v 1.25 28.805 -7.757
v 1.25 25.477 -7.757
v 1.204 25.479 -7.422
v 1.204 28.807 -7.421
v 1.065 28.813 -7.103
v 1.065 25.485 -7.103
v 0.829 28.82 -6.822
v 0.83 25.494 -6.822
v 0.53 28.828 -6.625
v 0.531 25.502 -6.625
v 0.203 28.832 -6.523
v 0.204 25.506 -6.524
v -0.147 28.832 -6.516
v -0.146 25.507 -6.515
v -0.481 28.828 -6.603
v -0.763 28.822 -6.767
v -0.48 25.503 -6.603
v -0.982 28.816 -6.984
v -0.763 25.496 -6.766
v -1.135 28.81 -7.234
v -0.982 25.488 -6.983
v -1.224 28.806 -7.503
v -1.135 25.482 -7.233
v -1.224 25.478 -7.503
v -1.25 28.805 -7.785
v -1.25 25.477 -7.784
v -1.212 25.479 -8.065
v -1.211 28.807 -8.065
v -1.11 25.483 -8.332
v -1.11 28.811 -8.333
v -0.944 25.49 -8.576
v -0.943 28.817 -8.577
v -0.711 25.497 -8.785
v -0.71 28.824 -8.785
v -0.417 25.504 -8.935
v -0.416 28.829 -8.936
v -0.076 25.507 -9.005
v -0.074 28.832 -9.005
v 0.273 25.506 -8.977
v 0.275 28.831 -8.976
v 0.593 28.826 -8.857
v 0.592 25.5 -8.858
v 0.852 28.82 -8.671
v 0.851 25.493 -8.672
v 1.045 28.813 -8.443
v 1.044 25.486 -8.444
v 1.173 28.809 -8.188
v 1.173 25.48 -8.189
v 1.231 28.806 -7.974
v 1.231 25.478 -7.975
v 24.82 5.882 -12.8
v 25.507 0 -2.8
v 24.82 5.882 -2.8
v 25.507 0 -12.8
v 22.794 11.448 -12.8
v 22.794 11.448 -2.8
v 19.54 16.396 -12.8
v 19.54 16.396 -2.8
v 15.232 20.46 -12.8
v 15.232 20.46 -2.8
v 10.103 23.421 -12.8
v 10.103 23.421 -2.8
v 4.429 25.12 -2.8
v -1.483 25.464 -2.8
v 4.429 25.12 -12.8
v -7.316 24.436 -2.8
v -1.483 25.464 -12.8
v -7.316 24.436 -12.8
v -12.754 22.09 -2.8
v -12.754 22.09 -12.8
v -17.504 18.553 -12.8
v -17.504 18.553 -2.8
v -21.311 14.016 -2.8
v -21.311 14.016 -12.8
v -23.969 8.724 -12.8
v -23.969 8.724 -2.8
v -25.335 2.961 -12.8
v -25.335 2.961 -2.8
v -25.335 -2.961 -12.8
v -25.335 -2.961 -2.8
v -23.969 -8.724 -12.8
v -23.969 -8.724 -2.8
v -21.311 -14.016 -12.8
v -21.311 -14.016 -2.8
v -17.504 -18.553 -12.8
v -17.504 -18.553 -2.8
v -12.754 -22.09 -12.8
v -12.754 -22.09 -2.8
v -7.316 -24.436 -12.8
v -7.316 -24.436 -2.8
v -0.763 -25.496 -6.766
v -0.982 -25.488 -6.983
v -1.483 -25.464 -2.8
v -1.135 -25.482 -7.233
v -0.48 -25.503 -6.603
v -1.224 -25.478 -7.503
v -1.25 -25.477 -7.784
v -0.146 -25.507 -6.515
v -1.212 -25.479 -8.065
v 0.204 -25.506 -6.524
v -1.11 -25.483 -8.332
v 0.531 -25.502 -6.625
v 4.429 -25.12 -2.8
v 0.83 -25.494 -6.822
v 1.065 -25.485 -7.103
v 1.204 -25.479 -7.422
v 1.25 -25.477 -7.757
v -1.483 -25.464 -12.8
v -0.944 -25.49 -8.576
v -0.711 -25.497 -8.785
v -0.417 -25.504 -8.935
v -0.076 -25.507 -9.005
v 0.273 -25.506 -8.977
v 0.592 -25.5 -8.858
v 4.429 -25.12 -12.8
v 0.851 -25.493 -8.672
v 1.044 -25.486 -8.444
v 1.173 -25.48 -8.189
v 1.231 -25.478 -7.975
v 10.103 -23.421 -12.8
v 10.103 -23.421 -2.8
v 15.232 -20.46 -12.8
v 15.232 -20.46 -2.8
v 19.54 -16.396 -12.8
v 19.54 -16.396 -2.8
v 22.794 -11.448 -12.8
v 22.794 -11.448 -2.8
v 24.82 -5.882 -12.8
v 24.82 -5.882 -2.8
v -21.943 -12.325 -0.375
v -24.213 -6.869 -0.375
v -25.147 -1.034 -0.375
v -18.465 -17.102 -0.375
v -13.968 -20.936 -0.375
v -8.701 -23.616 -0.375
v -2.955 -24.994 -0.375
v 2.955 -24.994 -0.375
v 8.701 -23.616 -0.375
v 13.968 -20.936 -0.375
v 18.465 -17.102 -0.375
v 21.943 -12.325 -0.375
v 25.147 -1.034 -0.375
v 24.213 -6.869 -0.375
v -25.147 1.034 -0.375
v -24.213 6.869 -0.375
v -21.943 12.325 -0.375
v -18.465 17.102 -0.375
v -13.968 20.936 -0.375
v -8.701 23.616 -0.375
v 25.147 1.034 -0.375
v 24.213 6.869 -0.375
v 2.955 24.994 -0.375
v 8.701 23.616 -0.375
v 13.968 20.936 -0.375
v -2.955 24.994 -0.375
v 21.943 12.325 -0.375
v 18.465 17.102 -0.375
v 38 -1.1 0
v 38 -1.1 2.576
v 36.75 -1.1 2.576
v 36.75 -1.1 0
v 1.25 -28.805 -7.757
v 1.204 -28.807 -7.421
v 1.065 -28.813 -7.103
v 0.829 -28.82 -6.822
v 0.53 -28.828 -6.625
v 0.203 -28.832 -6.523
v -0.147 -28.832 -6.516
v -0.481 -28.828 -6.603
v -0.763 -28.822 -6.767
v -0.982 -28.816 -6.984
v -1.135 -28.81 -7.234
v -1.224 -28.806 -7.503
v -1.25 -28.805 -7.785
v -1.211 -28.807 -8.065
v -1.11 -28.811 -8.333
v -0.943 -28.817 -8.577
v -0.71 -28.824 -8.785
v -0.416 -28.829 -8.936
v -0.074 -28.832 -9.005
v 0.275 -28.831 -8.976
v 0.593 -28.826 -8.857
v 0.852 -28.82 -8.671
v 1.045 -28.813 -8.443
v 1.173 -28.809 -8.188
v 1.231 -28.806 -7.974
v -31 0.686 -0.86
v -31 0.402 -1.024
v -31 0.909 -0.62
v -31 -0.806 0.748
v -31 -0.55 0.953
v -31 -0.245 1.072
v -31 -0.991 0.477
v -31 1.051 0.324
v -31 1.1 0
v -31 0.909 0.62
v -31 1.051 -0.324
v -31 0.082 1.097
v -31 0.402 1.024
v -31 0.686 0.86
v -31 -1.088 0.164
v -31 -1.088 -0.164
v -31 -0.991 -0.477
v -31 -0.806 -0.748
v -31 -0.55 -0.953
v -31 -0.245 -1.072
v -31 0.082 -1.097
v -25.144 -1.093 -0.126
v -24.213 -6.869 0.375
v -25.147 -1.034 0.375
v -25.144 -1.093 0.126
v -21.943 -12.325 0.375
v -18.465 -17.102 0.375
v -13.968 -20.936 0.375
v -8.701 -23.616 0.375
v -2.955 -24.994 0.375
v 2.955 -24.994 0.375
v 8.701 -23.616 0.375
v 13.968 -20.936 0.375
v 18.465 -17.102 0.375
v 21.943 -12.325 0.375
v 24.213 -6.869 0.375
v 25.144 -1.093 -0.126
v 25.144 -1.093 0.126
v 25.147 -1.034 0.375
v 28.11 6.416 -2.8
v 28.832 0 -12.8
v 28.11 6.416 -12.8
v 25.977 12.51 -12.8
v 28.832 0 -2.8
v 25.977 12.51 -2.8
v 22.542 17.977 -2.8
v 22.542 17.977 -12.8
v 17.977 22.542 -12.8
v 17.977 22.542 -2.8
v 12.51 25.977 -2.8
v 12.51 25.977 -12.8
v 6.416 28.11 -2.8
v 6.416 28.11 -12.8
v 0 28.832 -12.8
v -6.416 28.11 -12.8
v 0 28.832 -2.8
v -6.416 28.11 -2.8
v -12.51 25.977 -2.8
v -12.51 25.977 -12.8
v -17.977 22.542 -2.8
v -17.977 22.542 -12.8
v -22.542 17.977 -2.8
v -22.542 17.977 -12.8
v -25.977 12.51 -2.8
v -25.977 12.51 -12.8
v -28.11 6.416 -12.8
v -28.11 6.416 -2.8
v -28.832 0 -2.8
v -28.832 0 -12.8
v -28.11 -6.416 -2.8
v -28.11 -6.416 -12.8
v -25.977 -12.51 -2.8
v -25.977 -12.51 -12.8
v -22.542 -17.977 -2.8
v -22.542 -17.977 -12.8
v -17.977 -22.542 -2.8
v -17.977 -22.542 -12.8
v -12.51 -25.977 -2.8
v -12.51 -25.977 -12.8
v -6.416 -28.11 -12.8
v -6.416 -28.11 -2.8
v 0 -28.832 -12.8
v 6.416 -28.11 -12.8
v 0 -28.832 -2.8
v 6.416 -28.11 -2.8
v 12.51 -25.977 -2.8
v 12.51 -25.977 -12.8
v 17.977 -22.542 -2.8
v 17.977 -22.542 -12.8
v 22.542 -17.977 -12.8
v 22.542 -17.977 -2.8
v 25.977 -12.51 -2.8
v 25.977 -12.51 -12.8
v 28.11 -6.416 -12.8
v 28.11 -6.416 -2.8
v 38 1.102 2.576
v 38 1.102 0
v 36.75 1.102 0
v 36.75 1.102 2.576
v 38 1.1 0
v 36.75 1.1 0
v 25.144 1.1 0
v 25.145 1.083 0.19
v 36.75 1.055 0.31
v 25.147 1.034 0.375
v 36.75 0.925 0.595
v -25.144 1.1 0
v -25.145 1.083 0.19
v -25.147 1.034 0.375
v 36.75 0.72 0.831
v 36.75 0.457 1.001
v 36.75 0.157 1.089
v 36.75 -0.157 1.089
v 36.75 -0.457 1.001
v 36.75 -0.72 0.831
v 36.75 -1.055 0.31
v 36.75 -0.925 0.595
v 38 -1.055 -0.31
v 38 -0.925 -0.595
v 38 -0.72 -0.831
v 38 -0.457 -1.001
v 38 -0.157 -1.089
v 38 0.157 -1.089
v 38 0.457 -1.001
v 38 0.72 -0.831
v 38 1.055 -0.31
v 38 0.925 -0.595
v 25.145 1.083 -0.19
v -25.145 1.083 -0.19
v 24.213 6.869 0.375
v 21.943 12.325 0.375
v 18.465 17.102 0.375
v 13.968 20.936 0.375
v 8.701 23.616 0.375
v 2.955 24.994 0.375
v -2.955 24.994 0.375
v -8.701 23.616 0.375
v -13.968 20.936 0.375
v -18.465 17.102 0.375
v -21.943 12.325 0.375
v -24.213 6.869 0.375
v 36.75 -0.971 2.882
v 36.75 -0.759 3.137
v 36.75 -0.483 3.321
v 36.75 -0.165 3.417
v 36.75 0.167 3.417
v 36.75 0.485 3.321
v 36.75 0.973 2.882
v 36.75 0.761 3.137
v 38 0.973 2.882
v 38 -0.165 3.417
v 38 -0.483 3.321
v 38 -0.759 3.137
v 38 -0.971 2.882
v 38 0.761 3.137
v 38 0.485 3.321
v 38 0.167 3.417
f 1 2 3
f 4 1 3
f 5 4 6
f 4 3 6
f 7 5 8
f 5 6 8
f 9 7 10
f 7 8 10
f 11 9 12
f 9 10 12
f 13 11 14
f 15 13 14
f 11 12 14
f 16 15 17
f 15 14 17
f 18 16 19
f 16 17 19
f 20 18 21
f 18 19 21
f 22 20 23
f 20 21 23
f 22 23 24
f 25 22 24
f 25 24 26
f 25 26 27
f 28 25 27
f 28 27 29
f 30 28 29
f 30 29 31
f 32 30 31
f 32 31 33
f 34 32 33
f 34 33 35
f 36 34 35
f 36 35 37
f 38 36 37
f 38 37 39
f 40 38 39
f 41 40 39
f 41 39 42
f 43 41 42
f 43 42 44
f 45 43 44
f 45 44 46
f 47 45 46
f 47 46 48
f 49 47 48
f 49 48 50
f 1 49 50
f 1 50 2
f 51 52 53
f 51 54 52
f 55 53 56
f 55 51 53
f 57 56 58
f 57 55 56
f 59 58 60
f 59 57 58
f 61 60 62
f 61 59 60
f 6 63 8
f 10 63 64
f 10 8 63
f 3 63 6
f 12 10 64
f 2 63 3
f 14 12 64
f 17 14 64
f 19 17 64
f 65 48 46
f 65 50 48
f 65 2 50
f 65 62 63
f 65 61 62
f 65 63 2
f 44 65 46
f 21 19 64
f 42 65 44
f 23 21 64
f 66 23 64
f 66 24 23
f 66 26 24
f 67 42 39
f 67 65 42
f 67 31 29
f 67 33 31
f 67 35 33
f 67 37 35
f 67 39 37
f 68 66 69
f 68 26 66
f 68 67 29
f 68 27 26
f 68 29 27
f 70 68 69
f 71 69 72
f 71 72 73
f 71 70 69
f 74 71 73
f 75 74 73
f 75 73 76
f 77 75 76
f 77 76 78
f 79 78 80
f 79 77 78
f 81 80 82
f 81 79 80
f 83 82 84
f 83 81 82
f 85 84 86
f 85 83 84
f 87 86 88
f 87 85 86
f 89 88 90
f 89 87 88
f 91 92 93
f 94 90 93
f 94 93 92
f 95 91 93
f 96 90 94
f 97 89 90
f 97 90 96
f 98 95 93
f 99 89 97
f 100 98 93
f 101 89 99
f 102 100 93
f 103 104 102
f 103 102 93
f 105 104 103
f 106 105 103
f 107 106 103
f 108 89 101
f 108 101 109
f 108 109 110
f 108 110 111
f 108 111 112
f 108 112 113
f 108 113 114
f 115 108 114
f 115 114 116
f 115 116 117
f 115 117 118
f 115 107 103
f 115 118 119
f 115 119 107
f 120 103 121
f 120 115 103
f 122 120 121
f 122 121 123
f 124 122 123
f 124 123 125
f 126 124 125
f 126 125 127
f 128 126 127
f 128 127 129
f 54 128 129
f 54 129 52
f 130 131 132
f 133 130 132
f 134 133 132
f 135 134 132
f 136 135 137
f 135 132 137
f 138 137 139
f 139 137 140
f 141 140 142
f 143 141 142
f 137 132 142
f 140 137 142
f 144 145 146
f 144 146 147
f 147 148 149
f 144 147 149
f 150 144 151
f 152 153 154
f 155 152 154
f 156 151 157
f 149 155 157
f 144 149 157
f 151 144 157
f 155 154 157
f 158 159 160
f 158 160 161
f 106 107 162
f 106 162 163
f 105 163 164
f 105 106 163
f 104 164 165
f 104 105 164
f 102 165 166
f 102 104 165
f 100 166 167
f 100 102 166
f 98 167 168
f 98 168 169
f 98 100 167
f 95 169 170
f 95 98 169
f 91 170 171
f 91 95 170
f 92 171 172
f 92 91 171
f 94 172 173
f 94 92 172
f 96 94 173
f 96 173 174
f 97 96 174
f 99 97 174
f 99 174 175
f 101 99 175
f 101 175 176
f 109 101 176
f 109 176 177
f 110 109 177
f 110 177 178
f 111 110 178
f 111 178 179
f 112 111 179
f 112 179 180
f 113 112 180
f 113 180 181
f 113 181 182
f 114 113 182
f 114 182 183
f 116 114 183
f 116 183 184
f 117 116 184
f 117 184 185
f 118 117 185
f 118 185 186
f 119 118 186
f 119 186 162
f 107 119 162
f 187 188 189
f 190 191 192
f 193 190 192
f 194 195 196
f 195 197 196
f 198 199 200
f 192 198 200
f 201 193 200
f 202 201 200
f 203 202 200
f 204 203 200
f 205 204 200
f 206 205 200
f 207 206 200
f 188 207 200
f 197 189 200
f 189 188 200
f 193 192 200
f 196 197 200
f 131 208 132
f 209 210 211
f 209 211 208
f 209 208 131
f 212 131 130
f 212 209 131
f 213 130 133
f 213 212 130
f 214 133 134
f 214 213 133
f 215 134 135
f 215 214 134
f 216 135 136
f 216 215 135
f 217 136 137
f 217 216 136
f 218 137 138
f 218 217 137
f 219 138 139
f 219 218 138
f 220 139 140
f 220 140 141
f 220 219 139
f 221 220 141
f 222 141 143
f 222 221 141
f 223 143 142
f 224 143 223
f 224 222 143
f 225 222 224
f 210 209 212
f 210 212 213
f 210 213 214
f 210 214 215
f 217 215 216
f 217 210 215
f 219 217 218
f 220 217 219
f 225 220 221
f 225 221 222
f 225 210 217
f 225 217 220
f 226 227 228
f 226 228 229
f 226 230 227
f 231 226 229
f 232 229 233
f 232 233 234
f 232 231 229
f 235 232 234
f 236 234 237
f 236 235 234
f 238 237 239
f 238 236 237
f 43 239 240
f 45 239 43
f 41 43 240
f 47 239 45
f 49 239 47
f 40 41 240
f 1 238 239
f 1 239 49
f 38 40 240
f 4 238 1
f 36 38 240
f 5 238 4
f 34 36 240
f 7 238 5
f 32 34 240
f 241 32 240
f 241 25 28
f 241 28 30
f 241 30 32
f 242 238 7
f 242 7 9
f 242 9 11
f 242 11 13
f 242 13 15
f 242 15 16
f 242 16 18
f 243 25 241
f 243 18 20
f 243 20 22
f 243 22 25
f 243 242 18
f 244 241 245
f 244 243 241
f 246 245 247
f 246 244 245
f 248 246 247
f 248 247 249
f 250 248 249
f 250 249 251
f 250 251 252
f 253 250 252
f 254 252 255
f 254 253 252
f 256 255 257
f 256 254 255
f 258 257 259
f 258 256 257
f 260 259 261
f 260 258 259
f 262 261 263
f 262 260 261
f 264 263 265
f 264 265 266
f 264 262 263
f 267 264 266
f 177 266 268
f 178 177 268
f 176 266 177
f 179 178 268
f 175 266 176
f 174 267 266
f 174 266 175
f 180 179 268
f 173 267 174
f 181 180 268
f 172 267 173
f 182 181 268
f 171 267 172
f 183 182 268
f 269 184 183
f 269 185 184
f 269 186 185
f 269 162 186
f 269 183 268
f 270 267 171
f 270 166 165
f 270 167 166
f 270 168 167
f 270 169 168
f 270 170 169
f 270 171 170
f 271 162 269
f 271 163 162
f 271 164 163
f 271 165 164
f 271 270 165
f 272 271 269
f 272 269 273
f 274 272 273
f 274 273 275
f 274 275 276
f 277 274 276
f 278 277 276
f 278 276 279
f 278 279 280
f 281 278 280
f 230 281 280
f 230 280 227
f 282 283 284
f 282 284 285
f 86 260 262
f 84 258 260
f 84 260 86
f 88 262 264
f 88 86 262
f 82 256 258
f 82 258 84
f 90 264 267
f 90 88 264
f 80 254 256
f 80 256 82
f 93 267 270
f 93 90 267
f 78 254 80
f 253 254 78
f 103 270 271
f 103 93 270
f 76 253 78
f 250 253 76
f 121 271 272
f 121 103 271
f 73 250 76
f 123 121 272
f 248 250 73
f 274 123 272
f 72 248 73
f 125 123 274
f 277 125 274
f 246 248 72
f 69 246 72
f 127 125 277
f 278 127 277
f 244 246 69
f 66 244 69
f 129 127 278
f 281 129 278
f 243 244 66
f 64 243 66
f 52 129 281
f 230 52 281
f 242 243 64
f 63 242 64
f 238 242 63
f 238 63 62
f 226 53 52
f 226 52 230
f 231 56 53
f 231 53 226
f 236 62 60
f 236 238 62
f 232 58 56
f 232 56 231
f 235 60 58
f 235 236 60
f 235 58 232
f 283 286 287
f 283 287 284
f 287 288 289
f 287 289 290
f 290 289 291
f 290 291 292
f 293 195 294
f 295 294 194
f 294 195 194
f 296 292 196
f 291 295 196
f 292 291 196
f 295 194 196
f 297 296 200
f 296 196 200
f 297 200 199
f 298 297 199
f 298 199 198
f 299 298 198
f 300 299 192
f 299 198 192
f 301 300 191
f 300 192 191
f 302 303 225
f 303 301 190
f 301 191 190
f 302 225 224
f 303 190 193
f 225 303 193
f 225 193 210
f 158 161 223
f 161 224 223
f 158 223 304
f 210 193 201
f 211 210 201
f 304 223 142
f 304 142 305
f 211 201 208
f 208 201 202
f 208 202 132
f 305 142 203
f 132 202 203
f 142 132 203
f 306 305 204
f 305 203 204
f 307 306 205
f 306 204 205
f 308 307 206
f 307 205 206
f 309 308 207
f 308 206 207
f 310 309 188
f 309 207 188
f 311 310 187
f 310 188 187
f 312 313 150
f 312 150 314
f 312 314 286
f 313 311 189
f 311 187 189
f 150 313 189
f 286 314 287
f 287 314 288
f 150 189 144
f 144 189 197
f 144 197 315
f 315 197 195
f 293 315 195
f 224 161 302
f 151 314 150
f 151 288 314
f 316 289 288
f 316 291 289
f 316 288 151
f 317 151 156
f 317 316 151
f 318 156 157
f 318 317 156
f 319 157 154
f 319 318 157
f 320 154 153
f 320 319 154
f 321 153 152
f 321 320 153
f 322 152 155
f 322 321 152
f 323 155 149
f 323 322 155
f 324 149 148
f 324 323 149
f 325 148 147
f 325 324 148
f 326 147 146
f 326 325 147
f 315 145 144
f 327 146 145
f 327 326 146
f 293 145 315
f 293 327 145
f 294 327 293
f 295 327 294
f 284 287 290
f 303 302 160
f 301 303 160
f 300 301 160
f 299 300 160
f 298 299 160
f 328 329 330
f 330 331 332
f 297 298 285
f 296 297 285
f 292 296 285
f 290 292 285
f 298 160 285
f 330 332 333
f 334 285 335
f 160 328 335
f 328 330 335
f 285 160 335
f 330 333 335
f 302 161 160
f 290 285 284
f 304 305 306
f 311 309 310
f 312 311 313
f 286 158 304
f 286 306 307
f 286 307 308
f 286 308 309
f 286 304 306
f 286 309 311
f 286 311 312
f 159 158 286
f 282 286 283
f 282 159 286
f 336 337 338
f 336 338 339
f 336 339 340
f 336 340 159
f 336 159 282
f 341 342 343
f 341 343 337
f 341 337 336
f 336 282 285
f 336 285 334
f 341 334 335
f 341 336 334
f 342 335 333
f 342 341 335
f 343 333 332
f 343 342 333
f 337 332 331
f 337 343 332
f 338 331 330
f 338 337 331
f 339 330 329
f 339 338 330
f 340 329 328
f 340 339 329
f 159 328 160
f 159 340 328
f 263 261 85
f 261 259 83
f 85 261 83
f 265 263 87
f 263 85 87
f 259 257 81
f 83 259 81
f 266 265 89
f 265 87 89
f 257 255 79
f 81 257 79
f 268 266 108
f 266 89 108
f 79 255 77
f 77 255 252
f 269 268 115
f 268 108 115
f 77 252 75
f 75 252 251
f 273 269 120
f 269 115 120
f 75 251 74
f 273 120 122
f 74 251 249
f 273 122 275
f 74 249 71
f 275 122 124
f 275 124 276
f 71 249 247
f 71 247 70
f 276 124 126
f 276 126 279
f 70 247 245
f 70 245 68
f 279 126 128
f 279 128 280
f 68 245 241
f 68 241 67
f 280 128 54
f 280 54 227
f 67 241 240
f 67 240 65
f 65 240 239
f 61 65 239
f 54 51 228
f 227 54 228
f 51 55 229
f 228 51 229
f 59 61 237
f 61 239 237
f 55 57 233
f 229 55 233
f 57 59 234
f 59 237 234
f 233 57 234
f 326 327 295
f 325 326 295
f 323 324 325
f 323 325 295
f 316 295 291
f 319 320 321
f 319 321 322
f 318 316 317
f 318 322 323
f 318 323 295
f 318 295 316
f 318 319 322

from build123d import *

# Parameters (mm, degrees)
F2_R      = 45.8267789271
F0_R      = 28.6708469649
F4_T      = -2.5
F9_R      = 28.8324086219
F9_R_2    = 25.5072919531
F10_DEPTH = 5
F11_R     = 1.25
F12_DEPTH = 28.8334086219
F13_DEPTH = 31
F14_R     = 25.1680354712
F15_DEPTH = 0.375
F16_R     = 1.1
F17_DEPTH = 38
F18_DEPTH = 31
F20_DEPTH = 1.25


# Not quite as in the source:
# - a feature of the source that left no trace in its solid (it failed there, or was rolled back) is left out


with BuildPart() as f3:
    # F2 (on offset) → F3 section 0
    with BuildSketch(Plane.XY.offset(140)):
        with Locations((0, 0.2770116553)):
            Circle(F2_R)
    # F0 (on Top) → F3 section 1
    with BuildSketch(Plane.XY):
        with Locations((0, -0.2653934062)):
            Circle(F0_R)
    loft()

    # F4
    f4_openings = [f3.faces().sort_by_distance(p)[0] for p in [
        (0, 0.277012, 140),
        (0, -0.265393, 0),
    ]]
    offset(amount=F4_T, openings=f4_openings)


with BuildPart() as f10:
    # F9 (on offset) → F10 (new body, symmetric)
    with BuildSketch(Plane.XY.offset(-7.8)):
        Circle(F9_R)
        Circle(F9_R_2, mode=Mode.SUBTRACT)
    extrude(amount=F10_DEPTH, both=True)

    # F11 (on Front) → F12 (cut, through all)
    with BuildSketch(Plane.XZ):
        with Locations((0, -7.7568855078)):
            Circle(F11_R)
    extrude(amount=F12_DEPTH, mode=Mode.SUBTRACT)

    # F11 (on Front) → F13 (cut)
    with BuildSketch(Plane.XZ):
        with Locations((0, -7.7568855078)):
            Circle(F11_R)
    extrude(amount=-F13_DEPTH, mode=Mode.SUBTRACT)


with BuildPart() as f15:
    # F14 (on Top) → F15 (new body, symmetric)
    with BuildSketch(Plane.XY):
        Circle(F14_R)
    extrude(amount=F15_DEPTH, both=True)

    # F16 (on Right) → F17 (join)
    with BuildSketch(Plane.YZ):
        Circle(F16_R)
    extrude(amount=F17_DEPTH)

    # F16 (on Right) → F18 (join)
    with BuildSketch(Plane.YZ):
        Circle(F16_R)
    extrude(amount=-F18_DEPTH)

    # F19 (on face) → F20 (join)
    with BuildSketch(Plane.YZ.offset(38)):
        with BuildLine():
            Line((-1.1, 2.5760282297), (-1.1, 0))
            ThreePointArc((-1.1, 0), (0, 1.1), (1.1, 0))
            Line((1.1, 0), (1.1020586826, 0))
            Line((1.1020586826, 0), (1.1020586826, 2.5760282297))
            ThreePointArc((1.1020586826, 2.5760282297), (0.0010293413, 3.4287400368), (-1.1, 2.5760282297))
        make_face()
        with BuildLine():
            ThreePointArc((1.1, 0), (0, 1.1), (-1.1, 0))
            Line((-1.1, 0), (1.1, 0))
        make_face()
    extrude(amount=-F20_DEPTH)


solid = Compound([f10.part, f15.part])
